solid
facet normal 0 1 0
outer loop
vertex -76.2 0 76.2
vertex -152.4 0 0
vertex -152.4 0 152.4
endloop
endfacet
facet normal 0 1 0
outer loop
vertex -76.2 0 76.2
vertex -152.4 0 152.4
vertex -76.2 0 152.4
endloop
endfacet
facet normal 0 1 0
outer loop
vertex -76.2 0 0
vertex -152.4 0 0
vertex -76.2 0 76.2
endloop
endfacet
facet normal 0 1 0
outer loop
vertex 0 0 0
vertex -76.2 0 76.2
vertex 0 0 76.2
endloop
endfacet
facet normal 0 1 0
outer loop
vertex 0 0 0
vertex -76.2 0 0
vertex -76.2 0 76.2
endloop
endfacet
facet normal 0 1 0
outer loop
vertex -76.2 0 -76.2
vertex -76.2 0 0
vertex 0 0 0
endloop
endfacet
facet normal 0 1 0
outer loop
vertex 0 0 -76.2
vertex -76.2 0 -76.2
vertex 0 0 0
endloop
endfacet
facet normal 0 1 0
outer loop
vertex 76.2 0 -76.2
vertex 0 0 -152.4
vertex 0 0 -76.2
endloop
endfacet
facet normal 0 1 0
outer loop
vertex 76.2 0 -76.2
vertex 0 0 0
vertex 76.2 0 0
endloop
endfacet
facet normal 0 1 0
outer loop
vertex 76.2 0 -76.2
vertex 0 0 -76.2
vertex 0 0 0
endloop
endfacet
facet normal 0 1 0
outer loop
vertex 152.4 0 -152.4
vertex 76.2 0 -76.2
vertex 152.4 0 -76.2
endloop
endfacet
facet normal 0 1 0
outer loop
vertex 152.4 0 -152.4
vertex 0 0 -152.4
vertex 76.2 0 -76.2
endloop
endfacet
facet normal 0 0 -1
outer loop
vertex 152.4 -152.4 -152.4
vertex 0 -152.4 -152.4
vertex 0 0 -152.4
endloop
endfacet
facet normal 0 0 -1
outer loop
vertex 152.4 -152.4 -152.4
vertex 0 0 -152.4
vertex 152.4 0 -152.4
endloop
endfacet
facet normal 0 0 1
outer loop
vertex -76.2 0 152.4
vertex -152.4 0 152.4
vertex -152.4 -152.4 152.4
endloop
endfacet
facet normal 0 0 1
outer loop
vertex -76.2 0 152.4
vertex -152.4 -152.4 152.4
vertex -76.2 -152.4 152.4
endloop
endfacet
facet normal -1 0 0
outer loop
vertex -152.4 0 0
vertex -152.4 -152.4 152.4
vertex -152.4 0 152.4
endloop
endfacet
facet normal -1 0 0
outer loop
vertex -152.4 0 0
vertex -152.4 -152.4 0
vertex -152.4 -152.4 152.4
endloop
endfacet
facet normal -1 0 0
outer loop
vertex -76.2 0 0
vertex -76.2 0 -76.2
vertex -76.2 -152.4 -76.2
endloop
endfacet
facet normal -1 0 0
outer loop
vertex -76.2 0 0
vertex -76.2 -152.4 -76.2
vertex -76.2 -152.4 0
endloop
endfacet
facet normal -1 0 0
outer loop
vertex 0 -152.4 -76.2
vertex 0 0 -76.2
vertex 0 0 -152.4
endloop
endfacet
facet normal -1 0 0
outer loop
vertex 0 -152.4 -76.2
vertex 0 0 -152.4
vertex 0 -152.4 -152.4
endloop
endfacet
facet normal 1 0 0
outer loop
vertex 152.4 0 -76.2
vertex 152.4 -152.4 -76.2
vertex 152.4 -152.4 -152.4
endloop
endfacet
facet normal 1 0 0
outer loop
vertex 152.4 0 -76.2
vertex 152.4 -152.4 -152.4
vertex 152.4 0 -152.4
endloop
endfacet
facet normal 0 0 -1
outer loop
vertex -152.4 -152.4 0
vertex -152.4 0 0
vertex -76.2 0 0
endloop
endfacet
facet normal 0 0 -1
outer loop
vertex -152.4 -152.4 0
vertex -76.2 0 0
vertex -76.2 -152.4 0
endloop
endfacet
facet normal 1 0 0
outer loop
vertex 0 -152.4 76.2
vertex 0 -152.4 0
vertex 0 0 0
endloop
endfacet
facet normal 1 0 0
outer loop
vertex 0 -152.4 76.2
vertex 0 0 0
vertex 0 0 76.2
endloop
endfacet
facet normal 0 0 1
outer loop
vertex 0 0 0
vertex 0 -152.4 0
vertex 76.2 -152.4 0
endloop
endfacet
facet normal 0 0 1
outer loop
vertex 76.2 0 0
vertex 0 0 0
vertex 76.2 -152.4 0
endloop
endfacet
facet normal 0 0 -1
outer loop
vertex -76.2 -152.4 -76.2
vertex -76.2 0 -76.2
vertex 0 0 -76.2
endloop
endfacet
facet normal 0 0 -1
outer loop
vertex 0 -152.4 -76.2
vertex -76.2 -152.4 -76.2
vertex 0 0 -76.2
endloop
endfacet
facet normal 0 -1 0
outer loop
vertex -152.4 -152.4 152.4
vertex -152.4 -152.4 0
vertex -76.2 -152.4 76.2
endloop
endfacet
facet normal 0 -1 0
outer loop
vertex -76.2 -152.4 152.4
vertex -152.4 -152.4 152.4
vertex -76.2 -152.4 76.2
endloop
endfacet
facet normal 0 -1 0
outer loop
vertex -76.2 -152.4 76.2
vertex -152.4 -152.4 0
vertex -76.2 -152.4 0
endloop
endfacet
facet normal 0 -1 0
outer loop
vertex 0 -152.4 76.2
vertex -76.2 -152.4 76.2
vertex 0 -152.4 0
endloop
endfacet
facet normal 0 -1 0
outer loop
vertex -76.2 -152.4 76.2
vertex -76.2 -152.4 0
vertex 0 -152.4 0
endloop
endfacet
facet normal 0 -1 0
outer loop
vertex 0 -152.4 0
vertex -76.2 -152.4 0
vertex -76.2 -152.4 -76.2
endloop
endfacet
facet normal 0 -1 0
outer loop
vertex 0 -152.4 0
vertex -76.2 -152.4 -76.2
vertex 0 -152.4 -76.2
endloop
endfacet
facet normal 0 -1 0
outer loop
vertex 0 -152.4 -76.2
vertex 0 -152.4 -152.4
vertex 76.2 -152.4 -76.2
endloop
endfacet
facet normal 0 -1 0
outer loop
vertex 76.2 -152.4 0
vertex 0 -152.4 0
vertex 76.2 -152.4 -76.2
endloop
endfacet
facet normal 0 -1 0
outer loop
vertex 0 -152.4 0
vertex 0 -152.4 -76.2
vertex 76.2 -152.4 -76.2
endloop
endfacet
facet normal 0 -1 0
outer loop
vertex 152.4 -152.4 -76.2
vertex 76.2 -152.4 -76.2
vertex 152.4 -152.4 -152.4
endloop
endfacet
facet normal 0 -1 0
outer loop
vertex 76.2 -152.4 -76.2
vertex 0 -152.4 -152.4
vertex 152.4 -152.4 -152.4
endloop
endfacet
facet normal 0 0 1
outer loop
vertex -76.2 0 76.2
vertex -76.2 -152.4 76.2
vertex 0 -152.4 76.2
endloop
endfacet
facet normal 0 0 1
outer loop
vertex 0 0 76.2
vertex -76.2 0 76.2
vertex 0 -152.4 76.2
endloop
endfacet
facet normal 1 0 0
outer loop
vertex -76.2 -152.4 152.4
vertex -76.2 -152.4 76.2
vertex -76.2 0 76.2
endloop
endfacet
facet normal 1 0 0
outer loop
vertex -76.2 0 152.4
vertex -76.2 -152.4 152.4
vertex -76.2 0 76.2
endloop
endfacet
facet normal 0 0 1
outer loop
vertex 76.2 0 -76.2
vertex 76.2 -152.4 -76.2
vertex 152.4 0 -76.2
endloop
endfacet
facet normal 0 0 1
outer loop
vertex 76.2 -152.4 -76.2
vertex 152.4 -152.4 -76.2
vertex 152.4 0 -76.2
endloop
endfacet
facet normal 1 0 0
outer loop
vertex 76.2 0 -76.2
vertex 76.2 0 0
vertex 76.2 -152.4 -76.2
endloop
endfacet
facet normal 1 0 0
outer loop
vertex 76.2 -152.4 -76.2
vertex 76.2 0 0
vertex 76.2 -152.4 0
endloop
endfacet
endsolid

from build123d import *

# Parameters (mm, degrees)
F0_W      = 152.4
F0_H      = 152.4
F1_DEPTH  = 152.4
F2_W      = 76.2
F2_H      = 76.2
F3_DEPTH  = 271.78
F4_W      = 152.4
F4_H      = 76.2
F5_DEPTH  = 76.2
F6_W      = 76.2
F6_H      = 152.4
F7_DEPTH  = 76.2
F8_W      = 76.2
F8_H      = 152.4
F9_DEPTH  = 76.2
F10_W     = 152.4
F10_H     = 76.2
F11_DEPTH = 76.2


with BuildPart() as f1:
    # F0 (on Front) → F1 (new body)
    with BuildSketch(Plane.XZ):
        Rectangle(F0_W, F0_H)
    extrude(amount=F1_DEPTH)

    # F2 (on face) → F3 (cut)
    with BuildSketch(Plane.XZ.offset(152.4)):
        with Locations((38.1, 38.1)):
            Rectangle(F2_W, F2_H)
    extrude(amount=-F3_DEPTH, mode=Mode.SUBTRACT)

    # F4 (on face) → F5 (join, symmetric)
    with BuildSketch(Plane(origin=(-76.2, 0, 0), x_dir=(0, -1, 0), z_dir=(-1, 0, 0))):
        with Locations((76.2, 38.1)):
            Rectangle(F4_W, F4_H)
    extrude(amount=F5_DEPTH, both=True)

    # F6 (on face) → F7 (join)
    with BuildSketch(Plane(origin=(0, 0, -76.2), x_dir=(1, 0, 0), z_dir=(0, 0, -1))):
        with Locations((38.1, 76.2)):
            Rectangle(F6_W, F6_H)
    extrude(amount=F7_DEPTH)

    # F8 (on face) → F9 (join)
    with BuildSketch(Plane.XY.offset(76.2)):
        with Locations((-114.3, -76.2)):
            Rectangle(F8_W, F8_H)
    extrude(amount=F9_DEPTH)

    # F10 (on face) → F11 (join, symmetric)
    with BuildSketch(Plane.YZ.offset(76.2)):
        with Locations((-76.2, -114.3)):
            Rectangle(F10_W, F10_H)
    extrude(amount=F11_DEPTH, both=True)


solid = f1.part
